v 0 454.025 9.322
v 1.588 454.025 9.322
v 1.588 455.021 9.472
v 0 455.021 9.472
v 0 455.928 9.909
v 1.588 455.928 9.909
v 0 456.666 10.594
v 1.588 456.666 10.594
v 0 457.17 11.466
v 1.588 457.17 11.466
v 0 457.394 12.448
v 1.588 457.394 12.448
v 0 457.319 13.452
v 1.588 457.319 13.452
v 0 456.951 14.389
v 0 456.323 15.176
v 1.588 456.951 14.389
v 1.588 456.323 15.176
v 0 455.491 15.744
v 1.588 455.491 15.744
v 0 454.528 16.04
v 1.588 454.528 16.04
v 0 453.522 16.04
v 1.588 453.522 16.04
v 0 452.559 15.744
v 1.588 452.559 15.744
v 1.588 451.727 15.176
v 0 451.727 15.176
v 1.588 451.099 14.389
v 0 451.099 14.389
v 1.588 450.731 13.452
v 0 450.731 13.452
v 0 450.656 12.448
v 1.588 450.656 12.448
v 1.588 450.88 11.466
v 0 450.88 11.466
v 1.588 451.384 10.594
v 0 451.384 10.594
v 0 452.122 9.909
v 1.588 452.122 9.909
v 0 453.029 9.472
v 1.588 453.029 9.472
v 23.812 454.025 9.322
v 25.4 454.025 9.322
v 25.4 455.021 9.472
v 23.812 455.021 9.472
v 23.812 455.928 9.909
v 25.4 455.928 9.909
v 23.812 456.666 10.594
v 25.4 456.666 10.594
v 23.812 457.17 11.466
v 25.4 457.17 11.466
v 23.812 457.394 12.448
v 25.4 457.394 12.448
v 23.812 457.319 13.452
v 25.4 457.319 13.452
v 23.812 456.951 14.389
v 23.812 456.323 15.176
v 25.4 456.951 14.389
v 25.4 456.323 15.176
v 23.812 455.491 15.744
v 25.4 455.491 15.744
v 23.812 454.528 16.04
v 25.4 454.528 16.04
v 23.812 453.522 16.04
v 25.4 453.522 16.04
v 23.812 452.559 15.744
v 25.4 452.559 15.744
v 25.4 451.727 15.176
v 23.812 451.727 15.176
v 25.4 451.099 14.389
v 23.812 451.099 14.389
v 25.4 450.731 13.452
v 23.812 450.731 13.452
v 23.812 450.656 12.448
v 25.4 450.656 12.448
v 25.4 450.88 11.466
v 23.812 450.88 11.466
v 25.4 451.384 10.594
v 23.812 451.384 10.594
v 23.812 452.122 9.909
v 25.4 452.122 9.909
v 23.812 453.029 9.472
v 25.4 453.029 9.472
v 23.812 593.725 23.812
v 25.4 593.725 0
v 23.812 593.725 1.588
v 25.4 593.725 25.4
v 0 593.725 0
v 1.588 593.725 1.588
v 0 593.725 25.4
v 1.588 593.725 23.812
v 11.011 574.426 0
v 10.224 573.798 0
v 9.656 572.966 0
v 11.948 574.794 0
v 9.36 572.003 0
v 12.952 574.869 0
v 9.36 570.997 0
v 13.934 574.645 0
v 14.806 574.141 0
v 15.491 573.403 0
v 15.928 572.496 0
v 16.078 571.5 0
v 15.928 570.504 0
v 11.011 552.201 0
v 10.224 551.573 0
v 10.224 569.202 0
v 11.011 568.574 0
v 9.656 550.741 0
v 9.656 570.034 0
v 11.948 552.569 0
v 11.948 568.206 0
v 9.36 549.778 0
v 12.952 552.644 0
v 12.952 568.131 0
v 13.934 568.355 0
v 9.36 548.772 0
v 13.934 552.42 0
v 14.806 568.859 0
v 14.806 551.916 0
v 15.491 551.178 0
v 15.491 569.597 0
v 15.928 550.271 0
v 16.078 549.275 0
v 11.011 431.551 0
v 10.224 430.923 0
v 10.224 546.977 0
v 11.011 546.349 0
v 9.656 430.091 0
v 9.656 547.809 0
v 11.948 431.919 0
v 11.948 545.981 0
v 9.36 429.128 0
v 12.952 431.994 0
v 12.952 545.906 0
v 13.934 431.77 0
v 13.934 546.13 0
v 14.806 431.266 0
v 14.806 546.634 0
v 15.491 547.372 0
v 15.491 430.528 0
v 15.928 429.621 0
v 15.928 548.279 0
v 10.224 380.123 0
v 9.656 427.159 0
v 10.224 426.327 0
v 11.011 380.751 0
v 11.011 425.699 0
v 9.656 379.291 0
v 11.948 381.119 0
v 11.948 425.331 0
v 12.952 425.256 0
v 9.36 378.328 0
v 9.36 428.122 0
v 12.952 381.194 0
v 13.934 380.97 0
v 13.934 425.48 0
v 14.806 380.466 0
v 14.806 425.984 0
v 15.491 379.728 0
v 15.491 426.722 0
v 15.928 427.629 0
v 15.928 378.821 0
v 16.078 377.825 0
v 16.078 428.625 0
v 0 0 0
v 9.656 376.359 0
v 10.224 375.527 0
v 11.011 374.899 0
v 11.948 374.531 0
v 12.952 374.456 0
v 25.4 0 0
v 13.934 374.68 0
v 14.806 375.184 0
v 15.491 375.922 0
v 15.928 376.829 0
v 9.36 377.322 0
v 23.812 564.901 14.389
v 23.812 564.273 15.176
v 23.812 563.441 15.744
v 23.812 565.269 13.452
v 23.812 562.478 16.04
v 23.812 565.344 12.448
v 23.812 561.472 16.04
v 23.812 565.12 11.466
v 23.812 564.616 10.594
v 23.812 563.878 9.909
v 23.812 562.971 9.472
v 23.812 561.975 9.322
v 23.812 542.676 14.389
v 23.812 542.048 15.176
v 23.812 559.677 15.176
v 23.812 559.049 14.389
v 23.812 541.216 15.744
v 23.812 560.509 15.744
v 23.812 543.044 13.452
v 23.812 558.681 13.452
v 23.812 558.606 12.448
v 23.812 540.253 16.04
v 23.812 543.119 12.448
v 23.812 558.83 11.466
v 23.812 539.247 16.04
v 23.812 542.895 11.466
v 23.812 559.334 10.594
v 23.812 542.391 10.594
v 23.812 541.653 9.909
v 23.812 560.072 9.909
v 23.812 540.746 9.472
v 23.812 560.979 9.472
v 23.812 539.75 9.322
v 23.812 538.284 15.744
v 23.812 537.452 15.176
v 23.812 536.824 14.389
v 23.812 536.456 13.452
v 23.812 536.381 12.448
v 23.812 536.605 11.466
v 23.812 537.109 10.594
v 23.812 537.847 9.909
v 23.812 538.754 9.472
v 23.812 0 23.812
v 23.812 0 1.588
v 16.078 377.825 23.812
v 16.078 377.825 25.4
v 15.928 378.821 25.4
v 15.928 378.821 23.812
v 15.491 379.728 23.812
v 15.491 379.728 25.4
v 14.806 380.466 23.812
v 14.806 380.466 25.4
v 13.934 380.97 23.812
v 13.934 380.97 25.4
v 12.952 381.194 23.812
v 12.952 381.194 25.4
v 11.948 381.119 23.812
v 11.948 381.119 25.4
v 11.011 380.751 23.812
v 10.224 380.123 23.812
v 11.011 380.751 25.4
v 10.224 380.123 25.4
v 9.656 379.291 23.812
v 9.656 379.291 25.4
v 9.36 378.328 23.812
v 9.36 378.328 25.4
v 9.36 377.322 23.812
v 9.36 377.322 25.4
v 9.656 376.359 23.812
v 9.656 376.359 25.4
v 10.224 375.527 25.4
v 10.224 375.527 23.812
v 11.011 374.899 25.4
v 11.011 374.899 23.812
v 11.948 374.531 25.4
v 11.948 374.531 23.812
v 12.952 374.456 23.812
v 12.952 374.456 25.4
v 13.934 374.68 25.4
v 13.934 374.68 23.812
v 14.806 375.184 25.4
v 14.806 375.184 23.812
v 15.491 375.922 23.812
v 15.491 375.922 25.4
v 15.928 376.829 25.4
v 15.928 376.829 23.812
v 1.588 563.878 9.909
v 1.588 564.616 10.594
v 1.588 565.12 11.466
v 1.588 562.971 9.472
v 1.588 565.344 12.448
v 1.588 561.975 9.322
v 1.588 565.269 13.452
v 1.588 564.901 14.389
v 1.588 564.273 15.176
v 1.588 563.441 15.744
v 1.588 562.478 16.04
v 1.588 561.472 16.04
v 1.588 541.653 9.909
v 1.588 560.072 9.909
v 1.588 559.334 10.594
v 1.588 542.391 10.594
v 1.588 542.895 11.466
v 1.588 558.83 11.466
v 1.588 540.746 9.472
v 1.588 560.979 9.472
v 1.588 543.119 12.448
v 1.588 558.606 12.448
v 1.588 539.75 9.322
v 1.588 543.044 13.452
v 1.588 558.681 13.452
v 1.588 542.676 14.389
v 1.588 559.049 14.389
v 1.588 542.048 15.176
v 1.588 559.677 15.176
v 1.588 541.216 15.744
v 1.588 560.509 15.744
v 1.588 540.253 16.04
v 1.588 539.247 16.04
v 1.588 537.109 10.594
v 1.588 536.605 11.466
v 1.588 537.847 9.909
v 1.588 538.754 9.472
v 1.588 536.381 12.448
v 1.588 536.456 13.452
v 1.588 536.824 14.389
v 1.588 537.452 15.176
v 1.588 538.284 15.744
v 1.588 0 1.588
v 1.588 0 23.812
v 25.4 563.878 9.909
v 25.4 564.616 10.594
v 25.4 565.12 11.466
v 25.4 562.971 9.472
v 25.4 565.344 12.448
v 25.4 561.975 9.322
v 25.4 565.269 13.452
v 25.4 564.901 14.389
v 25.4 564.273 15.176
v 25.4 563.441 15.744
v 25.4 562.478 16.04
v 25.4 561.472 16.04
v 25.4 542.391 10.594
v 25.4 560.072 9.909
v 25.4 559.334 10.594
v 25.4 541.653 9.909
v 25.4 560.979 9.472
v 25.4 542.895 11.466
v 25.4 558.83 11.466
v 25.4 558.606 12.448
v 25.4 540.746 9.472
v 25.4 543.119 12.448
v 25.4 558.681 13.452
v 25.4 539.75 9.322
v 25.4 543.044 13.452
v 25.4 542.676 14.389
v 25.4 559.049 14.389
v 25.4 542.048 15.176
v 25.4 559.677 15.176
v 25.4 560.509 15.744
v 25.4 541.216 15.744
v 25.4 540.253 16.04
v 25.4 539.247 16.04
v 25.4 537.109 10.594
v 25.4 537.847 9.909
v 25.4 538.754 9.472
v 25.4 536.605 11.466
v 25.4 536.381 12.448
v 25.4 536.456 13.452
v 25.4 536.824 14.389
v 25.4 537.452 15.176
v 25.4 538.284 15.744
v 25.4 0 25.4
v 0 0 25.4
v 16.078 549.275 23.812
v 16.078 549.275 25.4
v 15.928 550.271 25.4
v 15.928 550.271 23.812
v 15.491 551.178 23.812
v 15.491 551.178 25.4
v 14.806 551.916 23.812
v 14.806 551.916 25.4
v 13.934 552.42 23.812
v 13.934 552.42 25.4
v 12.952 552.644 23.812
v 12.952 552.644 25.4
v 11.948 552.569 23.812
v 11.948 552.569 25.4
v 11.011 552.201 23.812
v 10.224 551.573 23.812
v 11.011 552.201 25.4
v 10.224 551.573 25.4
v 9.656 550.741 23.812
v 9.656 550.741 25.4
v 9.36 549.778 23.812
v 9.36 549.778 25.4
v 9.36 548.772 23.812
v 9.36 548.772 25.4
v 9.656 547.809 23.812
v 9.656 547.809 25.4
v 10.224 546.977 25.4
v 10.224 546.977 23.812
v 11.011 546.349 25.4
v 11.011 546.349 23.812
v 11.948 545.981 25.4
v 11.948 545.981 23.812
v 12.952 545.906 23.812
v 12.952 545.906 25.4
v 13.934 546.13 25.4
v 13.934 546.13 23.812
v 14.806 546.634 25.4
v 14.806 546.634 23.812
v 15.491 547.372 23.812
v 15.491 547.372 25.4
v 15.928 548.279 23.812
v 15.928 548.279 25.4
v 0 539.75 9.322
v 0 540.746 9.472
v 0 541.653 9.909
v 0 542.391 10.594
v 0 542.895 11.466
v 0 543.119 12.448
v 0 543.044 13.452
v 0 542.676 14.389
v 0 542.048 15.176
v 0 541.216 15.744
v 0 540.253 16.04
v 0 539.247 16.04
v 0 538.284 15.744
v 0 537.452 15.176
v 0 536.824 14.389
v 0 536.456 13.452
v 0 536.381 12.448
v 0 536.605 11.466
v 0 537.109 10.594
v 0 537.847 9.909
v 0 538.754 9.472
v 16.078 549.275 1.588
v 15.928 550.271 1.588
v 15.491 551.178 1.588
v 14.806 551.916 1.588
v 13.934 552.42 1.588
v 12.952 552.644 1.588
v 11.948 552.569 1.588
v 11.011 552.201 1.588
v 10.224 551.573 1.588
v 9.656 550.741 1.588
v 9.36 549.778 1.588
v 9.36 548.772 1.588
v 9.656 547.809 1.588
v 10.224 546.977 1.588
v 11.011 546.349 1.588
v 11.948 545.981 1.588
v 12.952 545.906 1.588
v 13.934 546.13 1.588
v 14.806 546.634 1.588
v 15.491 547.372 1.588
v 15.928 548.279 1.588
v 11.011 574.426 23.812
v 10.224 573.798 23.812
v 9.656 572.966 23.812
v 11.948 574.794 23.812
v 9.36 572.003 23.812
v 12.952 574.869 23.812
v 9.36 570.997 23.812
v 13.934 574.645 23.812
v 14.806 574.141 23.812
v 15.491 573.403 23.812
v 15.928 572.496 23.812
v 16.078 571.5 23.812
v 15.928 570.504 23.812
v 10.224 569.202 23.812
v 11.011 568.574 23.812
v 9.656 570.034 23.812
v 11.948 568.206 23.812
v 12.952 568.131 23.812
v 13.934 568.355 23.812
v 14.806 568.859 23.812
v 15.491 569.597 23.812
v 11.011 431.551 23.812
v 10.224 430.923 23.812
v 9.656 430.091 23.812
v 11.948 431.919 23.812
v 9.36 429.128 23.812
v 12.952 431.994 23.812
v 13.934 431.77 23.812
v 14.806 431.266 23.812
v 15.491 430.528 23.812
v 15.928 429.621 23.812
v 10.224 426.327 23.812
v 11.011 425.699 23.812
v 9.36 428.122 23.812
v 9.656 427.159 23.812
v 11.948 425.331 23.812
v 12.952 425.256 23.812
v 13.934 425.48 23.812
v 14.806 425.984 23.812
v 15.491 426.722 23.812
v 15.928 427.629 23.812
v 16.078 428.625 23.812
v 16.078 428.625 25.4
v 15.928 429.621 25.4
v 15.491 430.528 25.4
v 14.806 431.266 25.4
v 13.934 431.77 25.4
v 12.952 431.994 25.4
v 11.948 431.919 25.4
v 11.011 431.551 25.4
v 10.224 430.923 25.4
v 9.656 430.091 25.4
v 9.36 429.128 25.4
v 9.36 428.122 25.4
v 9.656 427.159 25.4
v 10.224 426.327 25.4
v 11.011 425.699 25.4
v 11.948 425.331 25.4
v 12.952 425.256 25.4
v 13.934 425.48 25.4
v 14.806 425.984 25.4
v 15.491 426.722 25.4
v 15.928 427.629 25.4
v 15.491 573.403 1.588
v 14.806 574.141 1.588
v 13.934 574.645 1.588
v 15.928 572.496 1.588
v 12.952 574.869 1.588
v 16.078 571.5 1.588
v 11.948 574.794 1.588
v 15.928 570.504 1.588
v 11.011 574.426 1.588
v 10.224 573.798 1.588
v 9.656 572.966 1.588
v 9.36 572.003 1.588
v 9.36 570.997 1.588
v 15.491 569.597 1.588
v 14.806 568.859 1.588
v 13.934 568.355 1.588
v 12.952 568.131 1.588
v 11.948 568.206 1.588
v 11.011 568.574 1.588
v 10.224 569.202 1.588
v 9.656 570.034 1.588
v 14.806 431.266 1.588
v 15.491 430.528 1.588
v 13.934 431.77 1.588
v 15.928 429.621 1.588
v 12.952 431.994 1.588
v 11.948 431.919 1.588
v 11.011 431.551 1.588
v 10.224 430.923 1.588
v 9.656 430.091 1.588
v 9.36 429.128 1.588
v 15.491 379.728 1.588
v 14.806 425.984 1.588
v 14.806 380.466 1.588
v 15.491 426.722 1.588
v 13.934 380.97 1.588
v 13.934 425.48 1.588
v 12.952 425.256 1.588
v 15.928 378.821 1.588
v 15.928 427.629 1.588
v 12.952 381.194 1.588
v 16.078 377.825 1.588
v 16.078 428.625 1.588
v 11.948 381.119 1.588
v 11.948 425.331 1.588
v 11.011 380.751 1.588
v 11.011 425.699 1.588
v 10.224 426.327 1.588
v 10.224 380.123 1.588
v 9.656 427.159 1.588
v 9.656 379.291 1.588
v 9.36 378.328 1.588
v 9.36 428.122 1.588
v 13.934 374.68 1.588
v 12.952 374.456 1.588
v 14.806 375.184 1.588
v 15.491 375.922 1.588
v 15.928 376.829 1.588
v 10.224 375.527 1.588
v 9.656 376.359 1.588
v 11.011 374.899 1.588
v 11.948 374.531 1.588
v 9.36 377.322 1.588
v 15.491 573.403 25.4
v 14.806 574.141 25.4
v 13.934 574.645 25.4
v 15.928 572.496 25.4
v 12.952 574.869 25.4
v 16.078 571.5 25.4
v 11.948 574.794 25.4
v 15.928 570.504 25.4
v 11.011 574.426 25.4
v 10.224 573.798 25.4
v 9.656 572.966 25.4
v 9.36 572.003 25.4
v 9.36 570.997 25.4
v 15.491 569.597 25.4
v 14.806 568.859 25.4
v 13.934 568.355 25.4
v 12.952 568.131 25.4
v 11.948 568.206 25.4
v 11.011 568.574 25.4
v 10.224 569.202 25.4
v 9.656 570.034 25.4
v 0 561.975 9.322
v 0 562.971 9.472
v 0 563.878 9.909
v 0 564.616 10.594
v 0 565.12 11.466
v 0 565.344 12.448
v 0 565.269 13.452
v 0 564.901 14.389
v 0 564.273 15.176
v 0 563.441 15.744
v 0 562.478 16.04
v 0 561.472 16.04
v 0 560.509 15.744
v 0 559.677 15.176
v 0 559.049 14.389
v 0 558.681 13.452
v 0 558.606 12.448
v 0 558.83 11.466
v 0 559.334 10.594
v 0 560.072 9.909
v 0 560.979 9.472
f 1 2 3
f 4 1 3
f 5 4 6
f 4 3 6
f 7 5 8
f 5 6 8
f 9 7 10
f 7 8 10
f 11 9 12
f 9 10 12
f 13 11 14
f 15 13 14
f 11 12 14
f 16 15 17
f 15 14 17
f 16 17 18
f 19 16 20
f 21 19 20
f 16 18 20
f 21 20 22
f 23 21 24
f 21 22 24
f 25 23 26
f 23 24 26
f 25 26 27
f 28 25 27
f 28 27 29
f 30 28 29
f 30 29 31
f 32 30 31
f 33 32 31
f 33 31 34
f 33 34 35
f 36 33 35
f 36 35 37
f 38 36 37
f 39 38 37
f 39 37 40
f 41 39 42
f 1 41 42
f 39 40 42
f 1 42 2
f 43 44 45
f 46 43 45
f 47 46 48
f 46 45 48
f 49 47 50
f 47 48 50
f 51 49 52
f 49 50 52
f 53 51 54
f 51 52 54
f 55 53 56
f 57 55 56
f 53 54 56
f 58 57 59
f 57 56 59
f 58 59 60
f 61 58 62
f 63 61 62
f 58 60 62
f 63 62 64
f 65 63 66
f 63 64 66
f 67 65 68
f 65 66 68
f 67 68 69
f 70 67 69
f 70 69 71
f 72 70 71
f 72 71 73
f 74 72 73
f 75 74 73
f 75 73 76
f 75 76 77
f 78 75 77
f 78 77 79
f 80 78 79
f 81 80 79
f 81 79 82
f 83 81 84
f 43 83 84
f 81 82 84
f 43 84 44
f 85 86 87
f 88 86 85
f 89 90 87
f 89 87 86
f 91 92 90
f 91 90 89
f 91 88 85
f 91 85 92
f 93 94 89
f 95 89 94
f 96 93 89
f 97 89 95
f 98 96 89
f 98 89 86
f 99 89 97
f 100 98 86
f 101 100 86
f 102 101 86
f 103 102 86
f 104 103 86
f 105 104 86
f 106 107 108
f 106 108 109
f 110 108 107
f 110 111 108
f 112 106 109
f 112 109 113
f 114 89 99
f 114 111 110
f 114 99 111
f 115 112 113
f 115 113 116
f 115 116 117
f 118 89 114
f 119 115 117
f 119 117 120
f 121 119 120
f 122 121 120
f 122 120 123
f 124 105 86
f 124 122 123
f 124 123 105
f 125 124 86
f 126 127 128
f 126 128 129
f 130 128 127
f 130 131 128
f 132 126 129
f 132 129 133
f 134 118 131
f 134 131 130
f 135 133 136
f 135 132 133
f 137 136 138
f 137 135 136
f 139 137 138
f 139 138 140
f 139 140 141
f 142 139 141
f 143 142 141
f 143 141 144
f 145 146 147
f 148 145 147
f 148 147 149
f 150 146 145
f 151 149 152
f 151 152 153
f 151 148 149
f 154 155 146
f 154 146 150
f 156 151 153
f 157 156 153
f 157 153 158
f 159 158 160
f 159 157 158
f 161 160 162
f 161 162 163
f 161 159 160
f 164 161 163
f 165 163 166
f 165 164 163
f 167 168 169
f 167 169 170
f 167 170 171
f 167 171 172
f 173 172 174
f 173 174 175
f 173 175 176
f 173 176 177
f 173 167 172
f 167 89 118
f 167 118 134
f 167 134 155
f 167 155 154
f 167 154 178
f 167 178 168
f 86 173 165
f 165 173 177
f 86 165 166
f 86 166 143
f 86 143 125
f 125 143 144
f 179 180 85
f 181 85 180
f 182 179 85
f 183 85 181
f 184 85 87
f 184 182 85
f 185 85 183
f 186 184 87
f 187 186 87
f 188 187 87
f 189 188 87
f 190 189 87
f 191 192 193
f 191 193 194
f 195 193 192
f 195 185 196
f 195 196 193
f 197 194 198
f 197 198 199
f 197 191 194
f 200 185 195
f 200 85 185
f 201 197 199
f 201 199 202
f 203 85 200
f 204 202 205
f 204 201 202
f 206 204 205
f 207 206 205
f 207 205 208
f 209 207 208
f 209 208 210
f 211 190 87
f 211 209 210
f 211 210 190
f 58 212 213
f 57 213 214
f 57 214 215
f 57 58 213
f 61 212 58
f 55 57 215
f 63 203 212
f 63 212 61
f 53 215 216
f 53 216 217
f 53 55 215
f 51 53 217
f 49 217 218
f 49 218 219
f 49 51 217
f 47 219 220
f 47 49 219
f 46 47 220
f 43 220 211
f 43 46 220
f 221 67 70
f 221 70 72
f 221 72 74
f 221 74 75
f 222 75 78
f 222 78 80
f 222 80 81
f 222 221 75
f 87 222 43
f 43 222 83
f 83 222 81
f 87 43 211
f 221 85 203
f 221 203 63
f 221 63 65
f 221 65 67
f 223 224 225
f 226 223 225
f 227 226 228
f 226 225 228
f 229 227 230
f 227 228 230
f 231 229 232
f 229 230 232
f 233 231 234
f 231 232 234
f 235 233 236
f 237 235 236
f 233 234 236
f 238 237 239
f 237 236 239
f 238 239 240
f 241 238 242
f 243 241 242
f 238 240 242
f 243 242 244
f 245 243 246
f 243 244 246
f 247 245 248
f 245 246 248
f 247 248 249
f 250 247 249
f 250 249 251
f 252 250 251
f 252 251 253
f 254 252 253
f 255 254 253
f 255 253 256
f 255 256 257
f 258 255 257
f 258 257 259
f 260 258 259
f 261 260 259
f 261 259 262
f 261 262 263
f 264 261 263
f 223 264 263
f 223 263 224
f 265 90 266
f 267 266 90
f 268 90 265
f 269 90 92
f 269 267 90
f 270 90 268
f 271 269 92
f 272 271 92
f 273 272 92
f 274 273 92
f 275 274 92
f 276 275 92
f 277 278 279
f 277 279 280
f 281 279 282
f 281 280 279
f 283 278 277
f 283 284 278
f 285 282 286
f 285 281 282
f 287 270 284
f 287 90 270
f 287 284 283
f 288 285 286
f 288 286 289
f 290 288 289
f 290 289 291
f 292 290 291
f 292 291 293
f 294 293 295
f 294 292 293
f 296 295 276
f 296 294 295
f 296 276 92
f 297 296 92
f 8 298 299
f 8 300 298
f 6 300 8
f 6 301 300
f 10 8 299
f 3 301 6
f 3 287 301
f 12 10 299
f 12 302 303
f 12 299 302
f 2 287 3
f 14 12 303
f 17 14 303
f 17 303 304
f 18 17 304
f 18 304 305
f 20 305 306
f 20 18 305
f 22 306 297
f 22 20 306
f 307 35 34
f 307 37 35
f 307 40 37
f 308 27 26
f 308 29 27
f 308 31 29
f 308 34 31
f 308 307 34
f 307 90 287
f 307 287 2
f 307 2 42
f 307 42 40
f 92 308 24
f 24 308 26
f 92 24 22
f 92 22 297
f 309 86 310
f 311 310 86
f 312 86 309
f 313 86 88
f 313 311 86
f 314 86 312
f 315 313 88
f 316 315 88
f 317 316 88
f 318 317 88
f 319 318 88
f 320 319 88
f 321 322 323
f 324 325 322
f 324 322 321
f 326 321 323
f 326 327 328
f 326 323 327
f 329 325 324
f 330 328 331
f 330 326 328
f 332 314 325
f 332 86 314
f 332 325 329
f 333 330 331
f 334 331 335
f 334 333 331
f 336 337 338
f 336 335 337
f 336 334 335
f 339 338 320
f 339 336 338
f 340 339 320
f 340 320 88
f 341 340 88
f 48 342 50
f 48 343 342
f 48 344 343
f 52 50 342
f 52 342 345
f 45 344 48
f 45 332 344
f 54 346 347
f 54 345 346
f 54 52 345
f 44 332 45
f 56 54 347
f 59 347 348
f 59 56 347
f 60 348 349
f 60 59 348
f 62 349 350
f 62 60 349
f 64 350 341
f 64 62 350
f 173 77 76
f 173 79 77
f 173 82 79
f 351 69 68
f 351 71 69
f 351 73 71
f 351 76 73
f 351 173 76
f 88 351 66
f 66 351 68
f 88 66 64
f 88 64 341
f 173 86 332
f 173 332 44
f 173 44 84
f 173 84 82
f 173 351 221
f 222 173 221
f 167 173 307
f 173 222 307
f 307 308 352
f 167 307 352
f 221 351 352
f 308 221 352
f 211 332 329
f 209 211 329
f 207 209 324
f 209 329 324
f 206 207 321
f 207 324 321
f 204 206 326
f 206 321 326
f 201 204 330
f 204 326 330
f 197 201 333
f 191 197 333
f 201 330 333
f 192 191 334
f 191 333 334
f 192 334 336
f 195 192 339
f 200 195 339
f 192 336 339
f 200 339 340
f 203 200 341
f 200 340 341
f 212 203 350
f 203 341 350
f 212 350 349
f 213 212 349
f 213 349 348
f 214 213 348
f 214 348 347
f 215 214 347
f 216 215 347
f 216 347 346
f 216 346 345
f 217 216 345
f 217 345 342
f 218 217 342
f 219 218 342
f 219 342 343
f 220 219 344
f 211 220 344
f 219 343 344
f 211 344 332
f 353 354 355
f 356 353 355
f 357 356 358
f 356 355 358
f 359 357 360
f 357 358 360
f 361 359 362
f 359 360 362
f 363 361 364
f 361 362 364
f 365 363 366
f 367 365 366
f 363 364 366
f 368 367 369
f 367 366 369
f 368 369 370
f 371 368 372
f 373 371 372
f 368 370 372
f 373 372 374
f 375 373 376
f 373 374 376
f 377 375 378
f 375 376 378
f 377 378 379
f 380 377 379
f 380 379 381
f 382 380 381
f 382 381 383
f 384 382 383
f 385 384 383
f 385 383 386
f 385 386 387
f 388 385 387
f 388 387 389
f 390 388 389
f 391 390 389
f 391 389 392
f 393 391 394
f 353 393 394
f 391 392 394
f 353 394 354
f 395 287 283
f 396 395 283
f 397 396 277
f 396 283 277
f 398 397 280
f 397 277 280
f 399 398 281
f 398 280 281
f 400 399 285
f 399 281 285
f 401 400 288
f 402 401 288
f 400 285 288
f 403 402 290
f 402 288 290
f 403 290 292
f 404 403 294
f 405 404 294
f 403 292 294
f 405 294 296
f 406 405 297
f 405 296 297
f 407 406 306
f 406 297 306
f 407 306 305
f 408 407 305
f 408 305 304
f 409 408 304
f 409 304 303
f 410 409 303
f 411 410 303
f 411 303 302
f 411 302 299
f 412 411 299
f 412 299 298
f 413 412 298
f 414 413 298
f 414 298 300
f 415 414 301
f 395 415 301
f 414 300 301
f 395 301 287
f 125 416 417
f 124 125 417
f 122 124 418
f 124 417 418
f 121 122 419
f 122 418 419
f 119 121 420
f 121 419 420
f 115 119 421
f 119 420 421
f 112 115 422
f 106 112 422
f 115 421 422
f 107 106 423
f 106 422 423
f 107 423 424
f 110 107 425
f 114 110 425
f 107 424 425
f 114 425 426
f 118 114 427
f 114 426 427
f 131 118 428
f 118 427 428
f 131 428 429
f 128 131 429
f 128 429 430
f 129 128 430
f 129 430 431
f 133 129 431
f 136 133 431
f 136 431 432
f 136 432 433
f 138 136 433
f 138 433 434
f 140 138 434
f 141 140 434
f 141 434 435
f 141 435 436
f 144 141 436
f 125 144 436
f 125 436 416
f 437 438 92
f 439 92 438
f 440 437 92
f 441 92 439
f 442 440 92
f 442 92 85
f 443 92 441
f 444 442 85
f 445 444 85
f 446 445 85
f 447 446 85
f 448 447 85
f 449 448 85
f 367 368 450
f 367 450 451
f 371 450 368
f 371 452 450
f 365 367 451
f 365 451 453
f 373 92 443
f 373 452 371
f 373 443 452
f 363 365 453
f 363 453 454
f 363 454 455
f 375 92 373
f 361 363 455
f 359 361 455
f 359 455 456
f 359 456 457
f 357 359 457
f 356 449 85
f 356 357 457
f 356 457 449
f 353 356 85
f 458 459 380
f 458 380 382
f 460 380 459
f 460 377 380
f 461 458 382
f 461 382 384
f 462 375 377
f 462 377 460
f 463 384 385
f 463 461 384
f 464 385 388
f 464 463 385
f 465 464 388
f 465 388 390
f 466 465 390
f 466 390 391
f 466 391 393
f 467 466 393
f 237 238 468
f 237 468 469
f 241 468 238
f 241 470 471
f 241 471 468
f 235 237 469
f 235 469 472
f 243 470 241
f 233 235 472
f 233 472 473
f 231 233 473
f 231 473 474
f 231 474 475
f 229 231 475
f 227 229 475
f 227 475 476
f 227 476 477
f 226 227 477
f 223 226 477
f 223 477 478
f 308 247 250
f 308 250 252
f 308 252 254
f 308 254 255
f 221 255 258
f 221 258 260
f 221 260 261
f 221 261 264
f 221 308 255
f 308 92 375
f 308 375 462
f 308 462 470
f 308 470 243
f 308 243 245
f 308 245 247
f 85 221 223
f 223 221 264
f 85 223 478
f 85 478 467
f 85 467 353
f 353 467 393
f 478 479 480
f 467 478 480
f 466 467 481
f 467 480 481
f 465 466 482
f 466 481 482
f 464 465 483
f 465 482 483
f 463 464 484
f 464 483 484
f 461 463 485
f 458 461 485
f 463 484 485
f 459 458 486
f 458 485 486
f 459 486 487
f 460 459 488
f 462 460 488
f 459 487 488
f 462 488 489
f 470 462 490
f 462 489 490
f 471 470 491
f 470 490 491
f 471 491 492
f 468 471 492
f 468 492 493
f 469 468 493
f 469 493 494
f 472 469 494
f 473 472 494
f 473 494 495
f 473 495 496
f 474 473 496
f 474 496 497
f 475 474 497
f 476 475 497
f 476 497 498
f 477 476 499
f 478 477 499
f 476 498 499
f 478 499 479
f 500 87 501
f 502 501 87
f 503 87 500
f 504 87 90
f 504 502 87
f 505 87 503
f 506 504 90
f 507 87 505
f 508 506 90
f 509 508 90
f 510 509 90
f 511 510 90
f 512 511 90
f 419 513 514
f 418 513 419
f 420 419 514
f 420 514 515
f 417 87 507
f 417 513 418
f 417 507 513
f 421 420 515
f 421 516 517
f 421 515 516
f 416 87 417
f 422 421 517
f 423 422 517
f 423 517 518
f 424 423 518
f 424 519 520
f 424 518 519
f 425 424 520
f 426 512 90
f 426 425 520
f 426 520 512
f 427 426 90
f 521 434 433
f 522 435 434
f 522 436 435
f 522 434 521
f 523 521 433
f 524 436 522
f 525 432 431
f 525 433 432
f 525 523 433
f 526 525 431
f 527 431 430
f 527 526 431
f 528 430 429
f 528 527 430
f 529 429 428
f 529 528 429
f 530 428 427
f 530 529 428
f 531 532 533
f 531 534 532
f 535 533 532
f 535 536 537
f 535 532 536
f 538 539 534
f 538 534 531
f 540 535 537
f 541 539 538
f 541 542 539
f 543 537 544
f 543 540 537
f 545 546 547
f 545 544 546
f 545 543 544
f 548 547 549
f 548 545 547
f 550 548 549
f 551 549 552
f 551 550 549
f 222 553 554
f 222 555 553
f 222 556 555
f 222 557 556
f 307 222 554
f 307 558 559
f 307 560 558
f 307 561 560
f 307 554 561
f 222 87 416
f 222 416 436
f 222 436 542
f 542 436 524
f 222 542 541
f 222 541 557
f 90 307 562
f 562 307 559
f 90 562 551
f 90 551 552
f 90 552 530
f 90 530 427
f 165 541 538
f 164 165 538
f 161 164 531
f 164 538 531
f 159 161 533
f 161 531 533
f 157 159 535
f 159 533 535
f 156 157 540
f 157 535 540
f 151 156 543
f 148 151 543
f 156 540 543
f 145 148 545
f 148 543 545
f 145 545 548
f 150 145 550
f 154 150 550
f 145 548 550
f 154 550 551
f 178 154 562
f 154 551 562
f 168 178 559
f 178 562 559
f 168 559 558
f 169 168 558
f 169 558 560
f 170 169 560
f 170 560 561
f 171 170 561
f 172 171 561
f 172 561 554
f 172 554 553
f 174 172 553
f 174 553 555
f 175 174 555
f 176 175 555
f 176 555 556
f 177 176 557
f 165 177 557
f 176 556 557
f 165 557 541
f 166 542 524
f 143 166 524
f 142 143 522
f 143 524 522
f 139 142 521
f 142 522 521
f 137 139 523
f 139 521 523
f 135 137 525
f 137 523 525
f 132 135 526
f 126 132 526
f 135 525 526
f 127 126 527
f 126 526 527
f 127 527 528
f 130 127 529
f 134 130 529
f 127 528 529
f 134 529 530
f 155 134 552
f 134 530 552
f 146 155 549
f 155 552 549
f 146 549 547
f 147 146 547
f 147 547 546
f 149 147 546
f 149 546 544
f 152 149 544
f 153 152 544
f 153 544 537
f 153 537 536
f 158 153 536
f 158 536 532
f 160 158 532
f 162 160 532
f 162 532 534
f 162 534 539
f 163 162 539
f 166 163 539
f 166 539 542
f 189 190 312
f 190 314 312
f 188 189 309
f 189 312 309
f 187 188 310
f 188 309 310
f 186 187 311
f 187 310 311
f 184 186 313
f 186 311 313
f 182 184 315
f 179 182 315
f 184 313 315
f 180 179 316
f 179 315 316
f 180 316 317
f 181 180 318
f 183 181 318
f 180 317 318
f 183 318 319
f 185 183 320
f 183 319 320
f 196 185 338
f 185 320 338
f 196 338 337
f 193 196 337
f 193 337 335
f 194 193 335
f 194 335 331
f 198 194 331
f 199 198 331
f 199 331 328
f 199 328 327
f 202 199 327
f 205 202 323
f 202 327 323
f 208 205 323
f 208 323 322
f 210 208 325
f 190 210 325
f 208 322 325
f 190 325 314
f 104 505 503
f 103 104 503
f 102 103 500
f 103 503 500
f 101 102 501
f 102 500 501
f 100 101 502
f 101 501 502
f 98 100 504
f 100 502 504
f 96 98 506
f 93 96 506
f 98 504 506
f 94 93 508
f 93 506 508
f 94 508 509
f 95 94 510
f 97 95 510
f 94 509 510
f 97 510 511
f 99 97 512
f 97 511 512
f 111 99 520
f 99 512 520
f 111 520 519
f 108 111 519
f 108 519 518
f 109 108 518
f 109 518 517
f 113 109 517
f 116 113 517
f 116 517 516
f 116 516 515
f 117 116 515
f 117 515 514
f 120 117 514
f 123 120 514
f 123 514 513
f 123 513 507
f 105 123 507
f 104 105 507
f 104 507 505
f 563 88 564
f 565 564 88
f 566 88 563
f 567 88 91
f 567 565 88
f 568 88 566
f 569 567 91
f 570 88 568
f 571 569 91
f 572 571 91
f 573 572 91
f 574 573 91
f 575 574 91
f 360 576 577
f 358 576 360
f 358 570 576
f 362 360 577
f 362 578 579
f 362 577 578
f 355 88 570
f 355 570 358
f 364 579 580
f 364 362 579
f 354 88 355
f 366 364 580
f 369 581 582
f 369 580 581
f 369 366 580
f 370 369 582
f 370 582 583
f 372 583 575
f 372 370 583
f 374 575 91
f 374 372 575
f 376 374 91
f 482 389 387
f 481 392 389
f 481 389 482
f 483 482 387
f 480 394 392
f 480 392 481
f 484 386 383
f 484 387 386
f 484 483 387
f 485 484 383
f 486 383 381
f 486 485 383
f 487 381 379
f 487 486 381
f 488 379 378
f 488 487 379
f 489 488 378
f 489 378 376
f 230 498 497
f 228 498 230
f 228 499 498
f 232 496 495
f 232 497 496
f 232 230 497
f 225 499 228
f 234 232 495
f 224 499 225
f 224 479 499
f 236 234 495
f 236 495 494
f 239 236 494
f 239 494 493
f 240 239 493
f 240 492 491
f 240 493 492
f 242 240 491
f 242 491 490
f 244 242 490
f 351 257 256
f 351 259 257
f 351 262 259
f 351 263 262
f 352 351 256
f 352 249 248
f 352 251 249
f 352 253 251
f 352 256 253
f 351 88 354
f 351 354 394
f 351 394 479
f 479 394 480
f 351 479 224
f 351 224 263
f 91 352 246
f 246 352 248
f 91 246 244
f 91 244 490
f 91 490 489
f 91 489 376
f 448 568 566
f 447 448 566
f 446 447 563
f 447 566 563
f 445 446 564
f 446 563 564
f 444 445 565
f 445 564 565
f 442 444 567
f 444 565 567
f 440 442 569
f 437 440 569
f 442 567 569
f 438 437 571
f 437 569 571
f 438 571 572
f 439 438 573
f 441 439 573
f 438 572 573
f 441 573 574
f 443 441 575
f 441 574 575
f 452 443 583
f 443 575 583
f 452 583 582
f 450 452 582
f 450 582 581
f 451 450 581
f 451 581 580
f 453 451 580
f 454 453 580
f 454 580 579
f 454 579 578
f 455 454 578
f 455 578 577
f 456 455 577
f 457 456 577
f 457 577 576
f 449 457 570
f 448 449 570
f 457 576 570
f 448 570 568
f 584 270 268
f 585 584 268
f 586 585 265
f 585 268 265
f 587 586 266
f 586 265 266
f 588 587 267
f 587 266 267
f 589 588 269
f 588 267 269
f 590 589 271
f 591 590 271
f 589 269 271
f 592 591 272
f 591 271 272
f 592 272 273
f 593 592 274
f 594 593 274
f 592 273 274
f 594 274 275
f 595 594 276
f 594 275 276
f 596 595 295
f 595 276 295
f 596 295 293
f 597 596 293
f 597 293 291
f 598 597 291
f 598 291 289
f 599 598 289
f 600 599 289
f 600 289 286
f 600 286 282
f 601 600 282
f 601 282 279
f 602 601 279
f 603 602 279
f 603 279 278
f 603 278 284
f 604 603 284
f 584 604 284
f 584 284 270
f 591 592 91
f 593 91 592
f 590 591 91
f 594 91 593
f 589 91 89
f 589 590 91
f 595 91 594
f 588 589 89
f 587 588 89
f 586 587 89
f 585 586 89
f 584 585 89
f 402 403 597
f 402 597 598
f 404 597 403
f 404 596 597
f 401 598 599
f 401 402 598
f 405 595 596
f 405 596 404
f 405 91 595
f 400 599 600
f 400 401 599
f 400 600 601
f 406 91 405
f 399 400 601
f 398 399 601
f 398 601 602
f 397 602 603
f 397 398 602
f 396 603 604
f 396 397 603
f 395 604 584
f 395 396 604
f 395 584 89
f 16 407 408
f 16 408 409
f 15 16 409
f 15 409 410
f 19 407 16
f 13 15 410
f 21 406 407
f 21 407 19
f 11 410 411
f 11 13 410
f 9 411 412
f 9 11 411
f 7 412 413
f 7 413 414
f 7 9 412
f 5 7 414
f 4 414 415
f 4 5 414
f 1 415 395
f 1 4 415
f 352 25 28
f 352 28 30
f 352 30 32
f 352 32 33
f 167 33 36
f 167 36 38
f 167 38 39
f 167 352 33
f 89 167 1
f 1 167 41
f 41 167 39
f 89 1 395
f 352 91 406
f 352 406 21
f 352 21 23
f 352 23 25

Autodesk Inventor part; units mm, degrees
ref_plane "YZ Plane" through (0, 0, 0) normal (1, 0, 0) x (0, 1, 0)
ref_plane "XZ Plane" through (0, 0, 0) normal (0, 1, 0) x (-1, 0, 0)
ref_plane "XY Plane" through (0, 0, 0) normal (0, 0, 1) x (1, 0, 0)
sketch "Sketch1" plane through (0, 0, 0) normal (0, 1, 0) x (-1, 0, 0)
  line L0 (0, 0) -> (-25.4, 0)
  line L1 (-25.4, 0) -> (-25.4, 25.4)
  line L2 (-25.4, 25.4) -> (0, 25.4)
  line L3 (0, 25.4) -> (0, 0)
  line L4 (-1.5875, 23.8125) -> (-23.8125, 23.8125)
  line L5 (-23.8125, 23.8125) -> (-23.8125, 1.5875)
  line L6 (-23.8125, 1.5875) -> (-1.5875, 1.5875)
  line L7 (-1.5875, 1.5875) -> (-1.5875, 23.8125)
  dimension "d0" = 25.4
  dimension "d2" = 25.4
  dimension "d3" = 1.5875
extrude "Extrusion1" add sketch "Sketch1" along normal blind 593.725
sketch "Sketch5" plane through (25.4, 0, 25.4) normal (1, 0, 0) x (0, 0, -1)
  circle A0 centre (12.7, 561.975) radius 3.3782 projected
  circle A1 centre (12.7, 539.75) radius 3.3782 projected
  circle A2 centre (12.7, 454.025) radius 3.3782 projected
extrude "Cut3" cut sketch "Sketch5" against normal blind 2540
sketch "Sketch6" plane through (0, 0, 25.4) normal (0, 0, 1) x (1, 0, 0)
  circle A0 centre (12.7, 428.625) radius 3.3782 projected
  circle A1 centre (12.7, 377.825) radius 3.3782 projected
  circle A2 centre (12.7, 571.5) radius 3.3782 projected
  circle A3 centre (12.7, 549.275) radius 3.3782 projected
extrude "Cut4" cut sketch "Sketch6" against normal blind 2540
equation "\"BendRadius\" = Thickness"
equation "\"BendReliefWidth\" = Thickness"
equation "\"BendReliefDepth\" = 0.5 * Thickness"
equation "\"CornerReliefSize\" = 4 * Thickness"
equation "\"MinimumRemnant\" = 2 * Thickness"
equation "\"TransitionRadius\" = BendRadius"
equation "\"JacobiRadiusSize\" = Thickness"
equation "\"GapSize\" = Thickness"
equation "\"Thickness\" = 3.048"
properties part number "edge mount shortened" material "Aluminum 6061"
